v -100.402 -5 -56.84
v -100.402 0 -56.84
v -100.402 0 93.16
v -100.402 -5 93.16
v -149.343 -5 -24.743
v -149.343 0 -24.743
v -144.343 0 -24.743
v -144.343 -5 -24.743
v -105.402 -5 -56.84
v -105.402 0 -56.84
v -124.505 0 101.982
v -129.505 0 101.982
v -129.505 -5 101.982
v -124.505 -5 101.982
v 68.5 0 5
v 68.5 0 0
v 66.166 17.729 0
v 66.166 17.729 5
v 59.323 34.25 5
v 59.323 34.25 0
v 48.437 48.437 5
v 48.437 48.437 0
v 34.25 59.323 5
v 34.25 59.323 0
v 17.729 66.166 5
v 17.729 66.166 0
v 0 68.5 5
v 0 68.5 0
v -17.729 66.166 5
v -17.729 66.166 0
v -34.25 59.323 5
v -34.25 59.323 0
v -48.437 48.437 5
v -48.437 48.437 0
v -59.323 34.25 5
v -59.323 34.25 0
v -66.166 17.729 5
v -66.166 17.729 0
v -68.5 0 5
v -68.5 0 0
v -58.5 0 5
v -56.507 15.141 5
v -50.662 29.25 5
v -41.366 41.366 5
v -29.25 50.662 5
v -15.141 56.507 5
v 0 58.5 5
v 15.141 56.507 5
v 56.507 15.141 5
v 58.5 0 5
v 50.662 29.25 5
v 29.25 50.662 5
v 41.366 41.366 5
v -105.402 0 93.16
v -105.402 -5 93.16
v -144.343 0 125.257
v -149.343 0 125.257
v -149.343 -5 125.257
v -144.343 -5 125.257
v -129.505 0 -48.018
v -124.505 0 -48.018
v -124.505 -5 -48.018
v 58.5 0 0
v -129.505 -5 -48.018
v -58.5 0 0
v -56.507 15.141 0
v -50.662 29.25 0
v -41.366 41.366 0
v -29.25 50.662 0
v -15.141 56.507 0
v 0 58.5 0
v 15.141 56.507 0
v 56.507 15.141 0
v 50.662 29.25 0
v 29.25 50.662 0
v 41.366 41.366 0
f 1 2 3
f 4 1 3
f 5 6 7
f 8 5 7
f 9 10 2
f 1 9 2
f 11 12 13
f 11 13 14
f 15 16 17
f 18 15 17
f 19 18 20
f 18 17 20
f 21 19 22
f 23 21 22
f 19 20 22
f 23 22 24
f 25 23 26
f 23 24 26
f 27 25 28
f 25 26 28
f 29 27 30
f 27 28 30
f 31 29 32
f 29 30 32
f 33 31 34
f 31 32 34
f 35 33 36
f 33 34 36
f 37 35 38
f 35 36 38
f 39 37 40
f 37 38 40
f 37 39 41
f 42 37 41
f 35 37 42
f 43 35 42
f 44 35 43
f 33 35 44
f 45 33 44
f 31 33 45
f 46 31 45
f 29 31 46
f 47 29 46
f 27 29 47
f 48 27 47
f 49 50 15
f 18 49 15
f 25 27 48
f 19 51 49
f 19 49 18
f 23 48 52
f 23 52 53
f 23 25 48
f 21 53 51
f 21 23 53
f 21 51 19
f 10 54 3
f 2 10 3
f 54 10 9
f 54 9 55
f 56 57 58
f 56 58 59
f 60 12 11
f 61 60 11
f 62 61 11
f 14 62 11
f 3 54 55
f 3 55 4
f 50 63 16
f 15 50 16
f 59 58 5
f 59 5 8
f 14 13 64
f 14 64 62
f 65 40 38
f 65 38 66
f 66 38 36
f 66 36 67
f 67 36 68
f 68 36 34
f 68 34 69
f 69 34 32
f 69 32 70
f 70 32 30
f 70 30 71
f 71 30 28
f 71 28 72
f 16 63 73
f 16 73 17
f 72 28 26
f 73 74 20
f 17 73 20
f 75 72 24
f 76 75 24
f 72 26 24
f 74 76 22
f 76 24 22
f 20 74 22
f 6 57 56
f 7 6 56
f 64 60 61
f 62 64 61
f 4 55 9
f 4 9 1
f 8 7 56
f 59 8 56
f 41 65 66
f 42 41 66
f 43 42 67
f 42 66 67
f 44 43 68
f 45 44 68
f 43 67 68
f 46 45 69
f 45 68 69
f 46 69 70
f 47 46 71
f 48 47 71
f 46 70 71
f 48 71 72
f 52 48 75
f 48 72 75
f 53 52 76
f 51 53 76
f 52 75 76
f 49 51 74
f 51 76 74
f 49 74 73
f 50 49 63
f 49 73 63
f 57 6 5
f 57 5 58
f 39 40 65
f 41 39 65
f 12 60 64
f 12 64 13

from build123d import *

# Parameters (mm, degrees)
F1_DEPTH = 5
F2_W     = 5
F2_H     = 150
F3_DEPTH = 5


with BuildPart() as f1:
    # F0 (on Top) → F1 (new body)
    with BuildSketch(Plane.XY):
        with BuildLine():
            Line((-68.5, 0), (-58.5, 0))
            ThreePointArc((-58.5, 0), (0, 58.5), (58.5, 0))
            Line((58.5, 0), (68.5, 0))
            ThreePointArc((68.5, 0), (0, 68.5), (-68.5, 0))
        make_face()
    extrude(amount=F1_DEPTH)


with BuildPart() as f3:
    # F2 (on Front) → F3 (new body)
    with BuildSketch(Plane.XZ):
        with Locations((-102.902481, 18.160425)):
            Rectangle(F2_W, F2_H)
        with Locations((-127.004966, 26.981985)):
            Rectangle(F2_W, F2_H)
        with Locations((-146.843255, 50.257023)):
            Rectangle(F2_W, F2_H)
    extrude(amount=F3_DEPTH)


solid = Compound([f1.part, f3.part])
